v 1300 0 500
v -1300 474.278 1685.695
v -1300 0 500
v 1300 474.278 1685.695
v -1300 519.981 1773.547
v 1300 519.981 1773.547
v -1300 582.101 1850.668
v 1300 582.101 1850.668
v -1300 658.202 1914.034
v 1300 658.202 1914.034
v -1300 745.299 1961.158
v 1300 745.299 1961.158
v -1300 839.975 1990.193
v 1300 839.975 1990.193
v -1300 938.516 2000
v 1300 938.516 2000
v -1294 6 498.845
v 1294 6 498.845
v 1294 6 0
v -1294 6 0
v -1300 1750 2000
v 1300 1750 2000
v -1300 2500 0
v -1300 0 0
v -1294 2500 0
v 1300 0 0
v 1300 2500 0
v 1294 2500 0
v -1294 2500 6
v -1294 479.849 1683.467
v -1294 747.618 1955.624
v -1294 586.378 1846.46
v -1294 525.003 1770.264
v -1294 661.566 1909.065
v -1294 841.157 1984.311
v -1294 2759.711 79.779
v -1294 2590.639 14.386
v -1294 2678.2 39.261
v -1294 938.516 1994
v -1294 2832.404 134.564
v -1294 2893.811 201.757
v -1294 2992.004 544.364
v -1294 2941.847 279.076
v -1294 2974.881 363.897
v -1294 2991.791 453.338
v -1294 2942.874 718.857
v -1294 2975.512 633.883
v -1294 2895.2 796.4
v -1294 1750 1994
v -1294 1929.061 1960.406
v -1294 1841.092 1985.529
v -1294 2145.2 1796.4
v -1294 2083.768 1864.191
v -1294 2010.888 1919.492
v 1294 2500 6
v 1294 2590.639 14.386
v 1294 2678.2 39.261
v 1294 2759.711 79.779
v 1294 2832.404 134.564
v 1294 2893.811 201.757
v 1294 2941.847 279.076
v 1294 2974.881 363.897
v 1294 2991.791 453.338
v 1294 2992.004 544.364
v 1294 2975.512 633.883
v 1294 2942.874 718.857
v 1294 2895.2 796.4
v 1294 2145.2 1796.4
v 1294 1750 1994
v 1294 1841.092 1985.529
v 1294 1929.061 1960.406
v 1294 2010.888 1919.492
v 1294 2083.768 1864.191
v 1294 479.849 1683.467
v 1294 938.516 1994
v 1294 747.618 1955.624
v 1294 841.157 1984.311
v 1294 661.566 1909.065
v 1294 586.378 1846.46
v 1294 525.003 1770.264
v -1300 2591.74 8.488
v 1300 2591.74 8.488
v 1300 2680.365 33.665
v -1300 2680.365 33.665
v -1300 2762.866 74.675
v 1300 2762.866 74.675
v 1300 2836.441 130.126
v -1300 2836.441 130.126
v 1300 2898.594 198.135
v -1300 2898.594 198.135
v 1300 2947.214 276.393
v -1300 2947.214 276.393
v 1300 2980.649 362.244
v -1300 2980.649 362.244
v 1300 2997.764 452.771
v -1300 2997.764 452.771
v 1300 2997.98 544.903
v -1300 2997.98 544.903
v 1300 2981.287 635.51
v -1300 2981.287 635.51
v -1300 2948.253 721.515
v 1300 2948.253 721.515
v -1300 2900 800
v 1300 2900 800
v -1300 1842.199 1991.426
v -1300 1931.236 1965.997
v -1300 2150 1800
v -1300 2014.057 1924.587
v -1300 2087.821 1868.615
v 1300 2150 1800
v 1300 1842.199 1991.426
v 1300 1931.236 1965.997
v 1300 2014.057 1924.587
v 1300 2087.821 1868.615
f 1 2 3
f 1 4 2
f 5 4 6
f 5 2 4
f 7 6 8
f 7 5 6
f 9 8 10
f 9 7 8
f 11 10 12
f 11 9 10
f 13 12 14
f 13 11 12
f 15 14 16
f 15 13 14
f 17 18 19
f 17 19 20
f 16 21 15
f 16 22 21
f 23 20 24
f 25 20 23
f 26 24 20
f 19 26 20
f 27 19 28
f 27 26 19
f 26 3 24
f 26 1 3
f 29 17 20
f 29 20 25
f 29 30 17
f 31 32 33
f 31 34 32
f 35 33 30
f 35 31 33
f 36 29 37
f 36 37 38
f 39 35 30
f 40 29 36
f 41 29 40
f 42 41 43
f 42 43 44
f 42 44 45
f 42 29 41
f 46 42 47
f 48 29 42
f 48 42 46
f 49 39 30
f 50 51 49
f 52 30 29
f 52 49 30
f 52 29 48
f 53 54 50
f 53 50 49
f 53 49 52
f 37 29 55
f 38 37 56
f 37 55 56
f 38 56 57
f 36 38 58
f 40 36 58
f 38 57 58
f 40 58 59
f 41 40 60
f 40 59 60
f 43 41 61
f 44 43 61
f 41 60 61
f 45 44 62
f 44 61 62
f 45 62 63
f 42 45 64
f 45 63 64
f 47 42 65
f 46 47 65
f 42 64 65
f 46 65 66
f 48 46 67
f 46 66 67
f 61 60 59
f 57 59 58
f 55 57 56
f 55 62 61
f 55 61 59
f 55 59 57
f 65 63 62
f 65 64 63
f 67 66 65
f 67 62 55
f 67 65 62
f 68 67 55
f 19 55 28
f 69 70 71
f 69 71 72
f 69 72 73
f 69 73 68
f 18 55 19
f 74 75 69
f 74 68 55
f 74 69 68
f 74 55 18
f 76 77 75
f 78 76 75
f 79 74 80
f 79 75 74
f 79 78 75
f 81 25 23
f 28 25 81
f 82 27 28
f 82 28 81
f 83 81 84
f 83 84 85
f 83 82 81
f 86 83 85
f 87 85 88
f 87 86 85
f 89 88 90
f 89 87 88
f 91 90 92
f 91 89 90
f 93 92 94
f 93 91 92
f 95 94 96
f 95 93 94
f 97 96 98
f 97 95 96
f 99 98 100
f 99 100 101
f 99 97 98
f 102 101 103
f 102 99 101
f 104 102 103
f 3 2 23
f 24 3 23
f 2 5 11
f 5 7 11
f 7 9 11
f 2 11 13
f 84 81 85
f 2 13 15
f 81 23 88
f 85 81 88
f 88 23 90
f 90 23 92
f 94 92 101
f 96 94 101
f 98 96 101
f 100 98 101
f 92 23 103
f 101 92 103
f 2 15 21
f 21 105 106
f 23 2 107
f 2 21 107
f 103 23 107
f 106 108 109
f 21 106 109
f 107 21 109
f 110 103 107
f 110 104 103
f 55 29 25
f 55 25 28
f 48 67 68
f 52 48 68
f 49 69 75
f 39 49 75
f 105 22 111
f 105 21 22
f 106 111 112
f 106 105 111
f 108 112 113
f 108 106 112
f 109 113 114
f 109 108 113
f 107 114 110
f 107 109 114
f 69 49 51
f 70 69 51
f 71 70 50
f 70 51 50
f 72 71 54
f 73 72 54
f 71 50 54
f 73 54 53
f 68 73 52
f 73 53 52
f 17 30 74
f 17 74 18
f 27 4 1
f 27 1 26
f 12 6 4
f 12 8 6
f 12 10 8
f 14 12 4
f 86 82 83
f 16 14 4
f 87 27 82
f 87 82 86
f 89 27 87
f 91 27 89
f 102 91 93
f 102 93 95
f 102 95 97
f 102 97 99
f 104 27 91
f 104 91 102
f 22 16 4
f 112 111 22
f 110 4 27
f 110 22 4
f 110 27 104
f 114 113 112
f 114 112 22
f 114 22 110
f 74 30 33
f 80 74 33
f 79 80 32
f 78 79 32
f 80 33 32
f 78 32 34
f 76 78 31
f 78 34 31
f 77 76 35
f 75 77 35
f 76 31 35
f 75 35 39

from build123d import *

# Parameters (mm, degrees)
F1_DEPTH = 1300
F2_R     = 500
F3_T     = -6


# Not quite as in the source:
# - a shell that OpenCascade refuses in one call is made with other operations: the cavity is built on its own and cut out


with BuildPart() as f1:
    # F0 (on Right) → F1 (new body, symmetric)
    with BuildSketch(Plane.YZ):
        with BuildLine():
            Line((0, 500), (0, 0))
            Line((0, 0), (2500, 0))
            ThreePointArc((2500, 0), (2947.2135955, 276.39320225), (2900, 800))
            Line((2900, 800), (2000, 2000))
            Line((2000, 2000), (600, 2000))
            Line((600, 2000), (0, 500))
        make_face()
    extrude(amount=F1_DEPTH, both=True)

    # F2
    f2_edges = [f1.edges().sort_by_distance(p)[0] for p in [
        (0, 600, 2000),
        (0, 2000, 2000),
    ]]
    fillet(f2_edges, radius=F2_R)

    # F3: a shell. OpenCascade refuses it in one call, so the cavity is built on its own and cut out:
    # the body offset inwards by the wall thickness, plus a prism from it out through each open face.
    f3_core = offset(f1.part, amount=F3_T, mode=Mode.PRIVATE)
    f3_exits = [f3_core.faces().sort_by_distance(p)[0] for p in [
        (0, 1253, 6),
    ]]
    add(f3_core, mode=Mode.SUBTRACT)
    extrude(f3_exits, amount=-F3_T, mode=Mode.SUBTRACT)


solid = f1.part
